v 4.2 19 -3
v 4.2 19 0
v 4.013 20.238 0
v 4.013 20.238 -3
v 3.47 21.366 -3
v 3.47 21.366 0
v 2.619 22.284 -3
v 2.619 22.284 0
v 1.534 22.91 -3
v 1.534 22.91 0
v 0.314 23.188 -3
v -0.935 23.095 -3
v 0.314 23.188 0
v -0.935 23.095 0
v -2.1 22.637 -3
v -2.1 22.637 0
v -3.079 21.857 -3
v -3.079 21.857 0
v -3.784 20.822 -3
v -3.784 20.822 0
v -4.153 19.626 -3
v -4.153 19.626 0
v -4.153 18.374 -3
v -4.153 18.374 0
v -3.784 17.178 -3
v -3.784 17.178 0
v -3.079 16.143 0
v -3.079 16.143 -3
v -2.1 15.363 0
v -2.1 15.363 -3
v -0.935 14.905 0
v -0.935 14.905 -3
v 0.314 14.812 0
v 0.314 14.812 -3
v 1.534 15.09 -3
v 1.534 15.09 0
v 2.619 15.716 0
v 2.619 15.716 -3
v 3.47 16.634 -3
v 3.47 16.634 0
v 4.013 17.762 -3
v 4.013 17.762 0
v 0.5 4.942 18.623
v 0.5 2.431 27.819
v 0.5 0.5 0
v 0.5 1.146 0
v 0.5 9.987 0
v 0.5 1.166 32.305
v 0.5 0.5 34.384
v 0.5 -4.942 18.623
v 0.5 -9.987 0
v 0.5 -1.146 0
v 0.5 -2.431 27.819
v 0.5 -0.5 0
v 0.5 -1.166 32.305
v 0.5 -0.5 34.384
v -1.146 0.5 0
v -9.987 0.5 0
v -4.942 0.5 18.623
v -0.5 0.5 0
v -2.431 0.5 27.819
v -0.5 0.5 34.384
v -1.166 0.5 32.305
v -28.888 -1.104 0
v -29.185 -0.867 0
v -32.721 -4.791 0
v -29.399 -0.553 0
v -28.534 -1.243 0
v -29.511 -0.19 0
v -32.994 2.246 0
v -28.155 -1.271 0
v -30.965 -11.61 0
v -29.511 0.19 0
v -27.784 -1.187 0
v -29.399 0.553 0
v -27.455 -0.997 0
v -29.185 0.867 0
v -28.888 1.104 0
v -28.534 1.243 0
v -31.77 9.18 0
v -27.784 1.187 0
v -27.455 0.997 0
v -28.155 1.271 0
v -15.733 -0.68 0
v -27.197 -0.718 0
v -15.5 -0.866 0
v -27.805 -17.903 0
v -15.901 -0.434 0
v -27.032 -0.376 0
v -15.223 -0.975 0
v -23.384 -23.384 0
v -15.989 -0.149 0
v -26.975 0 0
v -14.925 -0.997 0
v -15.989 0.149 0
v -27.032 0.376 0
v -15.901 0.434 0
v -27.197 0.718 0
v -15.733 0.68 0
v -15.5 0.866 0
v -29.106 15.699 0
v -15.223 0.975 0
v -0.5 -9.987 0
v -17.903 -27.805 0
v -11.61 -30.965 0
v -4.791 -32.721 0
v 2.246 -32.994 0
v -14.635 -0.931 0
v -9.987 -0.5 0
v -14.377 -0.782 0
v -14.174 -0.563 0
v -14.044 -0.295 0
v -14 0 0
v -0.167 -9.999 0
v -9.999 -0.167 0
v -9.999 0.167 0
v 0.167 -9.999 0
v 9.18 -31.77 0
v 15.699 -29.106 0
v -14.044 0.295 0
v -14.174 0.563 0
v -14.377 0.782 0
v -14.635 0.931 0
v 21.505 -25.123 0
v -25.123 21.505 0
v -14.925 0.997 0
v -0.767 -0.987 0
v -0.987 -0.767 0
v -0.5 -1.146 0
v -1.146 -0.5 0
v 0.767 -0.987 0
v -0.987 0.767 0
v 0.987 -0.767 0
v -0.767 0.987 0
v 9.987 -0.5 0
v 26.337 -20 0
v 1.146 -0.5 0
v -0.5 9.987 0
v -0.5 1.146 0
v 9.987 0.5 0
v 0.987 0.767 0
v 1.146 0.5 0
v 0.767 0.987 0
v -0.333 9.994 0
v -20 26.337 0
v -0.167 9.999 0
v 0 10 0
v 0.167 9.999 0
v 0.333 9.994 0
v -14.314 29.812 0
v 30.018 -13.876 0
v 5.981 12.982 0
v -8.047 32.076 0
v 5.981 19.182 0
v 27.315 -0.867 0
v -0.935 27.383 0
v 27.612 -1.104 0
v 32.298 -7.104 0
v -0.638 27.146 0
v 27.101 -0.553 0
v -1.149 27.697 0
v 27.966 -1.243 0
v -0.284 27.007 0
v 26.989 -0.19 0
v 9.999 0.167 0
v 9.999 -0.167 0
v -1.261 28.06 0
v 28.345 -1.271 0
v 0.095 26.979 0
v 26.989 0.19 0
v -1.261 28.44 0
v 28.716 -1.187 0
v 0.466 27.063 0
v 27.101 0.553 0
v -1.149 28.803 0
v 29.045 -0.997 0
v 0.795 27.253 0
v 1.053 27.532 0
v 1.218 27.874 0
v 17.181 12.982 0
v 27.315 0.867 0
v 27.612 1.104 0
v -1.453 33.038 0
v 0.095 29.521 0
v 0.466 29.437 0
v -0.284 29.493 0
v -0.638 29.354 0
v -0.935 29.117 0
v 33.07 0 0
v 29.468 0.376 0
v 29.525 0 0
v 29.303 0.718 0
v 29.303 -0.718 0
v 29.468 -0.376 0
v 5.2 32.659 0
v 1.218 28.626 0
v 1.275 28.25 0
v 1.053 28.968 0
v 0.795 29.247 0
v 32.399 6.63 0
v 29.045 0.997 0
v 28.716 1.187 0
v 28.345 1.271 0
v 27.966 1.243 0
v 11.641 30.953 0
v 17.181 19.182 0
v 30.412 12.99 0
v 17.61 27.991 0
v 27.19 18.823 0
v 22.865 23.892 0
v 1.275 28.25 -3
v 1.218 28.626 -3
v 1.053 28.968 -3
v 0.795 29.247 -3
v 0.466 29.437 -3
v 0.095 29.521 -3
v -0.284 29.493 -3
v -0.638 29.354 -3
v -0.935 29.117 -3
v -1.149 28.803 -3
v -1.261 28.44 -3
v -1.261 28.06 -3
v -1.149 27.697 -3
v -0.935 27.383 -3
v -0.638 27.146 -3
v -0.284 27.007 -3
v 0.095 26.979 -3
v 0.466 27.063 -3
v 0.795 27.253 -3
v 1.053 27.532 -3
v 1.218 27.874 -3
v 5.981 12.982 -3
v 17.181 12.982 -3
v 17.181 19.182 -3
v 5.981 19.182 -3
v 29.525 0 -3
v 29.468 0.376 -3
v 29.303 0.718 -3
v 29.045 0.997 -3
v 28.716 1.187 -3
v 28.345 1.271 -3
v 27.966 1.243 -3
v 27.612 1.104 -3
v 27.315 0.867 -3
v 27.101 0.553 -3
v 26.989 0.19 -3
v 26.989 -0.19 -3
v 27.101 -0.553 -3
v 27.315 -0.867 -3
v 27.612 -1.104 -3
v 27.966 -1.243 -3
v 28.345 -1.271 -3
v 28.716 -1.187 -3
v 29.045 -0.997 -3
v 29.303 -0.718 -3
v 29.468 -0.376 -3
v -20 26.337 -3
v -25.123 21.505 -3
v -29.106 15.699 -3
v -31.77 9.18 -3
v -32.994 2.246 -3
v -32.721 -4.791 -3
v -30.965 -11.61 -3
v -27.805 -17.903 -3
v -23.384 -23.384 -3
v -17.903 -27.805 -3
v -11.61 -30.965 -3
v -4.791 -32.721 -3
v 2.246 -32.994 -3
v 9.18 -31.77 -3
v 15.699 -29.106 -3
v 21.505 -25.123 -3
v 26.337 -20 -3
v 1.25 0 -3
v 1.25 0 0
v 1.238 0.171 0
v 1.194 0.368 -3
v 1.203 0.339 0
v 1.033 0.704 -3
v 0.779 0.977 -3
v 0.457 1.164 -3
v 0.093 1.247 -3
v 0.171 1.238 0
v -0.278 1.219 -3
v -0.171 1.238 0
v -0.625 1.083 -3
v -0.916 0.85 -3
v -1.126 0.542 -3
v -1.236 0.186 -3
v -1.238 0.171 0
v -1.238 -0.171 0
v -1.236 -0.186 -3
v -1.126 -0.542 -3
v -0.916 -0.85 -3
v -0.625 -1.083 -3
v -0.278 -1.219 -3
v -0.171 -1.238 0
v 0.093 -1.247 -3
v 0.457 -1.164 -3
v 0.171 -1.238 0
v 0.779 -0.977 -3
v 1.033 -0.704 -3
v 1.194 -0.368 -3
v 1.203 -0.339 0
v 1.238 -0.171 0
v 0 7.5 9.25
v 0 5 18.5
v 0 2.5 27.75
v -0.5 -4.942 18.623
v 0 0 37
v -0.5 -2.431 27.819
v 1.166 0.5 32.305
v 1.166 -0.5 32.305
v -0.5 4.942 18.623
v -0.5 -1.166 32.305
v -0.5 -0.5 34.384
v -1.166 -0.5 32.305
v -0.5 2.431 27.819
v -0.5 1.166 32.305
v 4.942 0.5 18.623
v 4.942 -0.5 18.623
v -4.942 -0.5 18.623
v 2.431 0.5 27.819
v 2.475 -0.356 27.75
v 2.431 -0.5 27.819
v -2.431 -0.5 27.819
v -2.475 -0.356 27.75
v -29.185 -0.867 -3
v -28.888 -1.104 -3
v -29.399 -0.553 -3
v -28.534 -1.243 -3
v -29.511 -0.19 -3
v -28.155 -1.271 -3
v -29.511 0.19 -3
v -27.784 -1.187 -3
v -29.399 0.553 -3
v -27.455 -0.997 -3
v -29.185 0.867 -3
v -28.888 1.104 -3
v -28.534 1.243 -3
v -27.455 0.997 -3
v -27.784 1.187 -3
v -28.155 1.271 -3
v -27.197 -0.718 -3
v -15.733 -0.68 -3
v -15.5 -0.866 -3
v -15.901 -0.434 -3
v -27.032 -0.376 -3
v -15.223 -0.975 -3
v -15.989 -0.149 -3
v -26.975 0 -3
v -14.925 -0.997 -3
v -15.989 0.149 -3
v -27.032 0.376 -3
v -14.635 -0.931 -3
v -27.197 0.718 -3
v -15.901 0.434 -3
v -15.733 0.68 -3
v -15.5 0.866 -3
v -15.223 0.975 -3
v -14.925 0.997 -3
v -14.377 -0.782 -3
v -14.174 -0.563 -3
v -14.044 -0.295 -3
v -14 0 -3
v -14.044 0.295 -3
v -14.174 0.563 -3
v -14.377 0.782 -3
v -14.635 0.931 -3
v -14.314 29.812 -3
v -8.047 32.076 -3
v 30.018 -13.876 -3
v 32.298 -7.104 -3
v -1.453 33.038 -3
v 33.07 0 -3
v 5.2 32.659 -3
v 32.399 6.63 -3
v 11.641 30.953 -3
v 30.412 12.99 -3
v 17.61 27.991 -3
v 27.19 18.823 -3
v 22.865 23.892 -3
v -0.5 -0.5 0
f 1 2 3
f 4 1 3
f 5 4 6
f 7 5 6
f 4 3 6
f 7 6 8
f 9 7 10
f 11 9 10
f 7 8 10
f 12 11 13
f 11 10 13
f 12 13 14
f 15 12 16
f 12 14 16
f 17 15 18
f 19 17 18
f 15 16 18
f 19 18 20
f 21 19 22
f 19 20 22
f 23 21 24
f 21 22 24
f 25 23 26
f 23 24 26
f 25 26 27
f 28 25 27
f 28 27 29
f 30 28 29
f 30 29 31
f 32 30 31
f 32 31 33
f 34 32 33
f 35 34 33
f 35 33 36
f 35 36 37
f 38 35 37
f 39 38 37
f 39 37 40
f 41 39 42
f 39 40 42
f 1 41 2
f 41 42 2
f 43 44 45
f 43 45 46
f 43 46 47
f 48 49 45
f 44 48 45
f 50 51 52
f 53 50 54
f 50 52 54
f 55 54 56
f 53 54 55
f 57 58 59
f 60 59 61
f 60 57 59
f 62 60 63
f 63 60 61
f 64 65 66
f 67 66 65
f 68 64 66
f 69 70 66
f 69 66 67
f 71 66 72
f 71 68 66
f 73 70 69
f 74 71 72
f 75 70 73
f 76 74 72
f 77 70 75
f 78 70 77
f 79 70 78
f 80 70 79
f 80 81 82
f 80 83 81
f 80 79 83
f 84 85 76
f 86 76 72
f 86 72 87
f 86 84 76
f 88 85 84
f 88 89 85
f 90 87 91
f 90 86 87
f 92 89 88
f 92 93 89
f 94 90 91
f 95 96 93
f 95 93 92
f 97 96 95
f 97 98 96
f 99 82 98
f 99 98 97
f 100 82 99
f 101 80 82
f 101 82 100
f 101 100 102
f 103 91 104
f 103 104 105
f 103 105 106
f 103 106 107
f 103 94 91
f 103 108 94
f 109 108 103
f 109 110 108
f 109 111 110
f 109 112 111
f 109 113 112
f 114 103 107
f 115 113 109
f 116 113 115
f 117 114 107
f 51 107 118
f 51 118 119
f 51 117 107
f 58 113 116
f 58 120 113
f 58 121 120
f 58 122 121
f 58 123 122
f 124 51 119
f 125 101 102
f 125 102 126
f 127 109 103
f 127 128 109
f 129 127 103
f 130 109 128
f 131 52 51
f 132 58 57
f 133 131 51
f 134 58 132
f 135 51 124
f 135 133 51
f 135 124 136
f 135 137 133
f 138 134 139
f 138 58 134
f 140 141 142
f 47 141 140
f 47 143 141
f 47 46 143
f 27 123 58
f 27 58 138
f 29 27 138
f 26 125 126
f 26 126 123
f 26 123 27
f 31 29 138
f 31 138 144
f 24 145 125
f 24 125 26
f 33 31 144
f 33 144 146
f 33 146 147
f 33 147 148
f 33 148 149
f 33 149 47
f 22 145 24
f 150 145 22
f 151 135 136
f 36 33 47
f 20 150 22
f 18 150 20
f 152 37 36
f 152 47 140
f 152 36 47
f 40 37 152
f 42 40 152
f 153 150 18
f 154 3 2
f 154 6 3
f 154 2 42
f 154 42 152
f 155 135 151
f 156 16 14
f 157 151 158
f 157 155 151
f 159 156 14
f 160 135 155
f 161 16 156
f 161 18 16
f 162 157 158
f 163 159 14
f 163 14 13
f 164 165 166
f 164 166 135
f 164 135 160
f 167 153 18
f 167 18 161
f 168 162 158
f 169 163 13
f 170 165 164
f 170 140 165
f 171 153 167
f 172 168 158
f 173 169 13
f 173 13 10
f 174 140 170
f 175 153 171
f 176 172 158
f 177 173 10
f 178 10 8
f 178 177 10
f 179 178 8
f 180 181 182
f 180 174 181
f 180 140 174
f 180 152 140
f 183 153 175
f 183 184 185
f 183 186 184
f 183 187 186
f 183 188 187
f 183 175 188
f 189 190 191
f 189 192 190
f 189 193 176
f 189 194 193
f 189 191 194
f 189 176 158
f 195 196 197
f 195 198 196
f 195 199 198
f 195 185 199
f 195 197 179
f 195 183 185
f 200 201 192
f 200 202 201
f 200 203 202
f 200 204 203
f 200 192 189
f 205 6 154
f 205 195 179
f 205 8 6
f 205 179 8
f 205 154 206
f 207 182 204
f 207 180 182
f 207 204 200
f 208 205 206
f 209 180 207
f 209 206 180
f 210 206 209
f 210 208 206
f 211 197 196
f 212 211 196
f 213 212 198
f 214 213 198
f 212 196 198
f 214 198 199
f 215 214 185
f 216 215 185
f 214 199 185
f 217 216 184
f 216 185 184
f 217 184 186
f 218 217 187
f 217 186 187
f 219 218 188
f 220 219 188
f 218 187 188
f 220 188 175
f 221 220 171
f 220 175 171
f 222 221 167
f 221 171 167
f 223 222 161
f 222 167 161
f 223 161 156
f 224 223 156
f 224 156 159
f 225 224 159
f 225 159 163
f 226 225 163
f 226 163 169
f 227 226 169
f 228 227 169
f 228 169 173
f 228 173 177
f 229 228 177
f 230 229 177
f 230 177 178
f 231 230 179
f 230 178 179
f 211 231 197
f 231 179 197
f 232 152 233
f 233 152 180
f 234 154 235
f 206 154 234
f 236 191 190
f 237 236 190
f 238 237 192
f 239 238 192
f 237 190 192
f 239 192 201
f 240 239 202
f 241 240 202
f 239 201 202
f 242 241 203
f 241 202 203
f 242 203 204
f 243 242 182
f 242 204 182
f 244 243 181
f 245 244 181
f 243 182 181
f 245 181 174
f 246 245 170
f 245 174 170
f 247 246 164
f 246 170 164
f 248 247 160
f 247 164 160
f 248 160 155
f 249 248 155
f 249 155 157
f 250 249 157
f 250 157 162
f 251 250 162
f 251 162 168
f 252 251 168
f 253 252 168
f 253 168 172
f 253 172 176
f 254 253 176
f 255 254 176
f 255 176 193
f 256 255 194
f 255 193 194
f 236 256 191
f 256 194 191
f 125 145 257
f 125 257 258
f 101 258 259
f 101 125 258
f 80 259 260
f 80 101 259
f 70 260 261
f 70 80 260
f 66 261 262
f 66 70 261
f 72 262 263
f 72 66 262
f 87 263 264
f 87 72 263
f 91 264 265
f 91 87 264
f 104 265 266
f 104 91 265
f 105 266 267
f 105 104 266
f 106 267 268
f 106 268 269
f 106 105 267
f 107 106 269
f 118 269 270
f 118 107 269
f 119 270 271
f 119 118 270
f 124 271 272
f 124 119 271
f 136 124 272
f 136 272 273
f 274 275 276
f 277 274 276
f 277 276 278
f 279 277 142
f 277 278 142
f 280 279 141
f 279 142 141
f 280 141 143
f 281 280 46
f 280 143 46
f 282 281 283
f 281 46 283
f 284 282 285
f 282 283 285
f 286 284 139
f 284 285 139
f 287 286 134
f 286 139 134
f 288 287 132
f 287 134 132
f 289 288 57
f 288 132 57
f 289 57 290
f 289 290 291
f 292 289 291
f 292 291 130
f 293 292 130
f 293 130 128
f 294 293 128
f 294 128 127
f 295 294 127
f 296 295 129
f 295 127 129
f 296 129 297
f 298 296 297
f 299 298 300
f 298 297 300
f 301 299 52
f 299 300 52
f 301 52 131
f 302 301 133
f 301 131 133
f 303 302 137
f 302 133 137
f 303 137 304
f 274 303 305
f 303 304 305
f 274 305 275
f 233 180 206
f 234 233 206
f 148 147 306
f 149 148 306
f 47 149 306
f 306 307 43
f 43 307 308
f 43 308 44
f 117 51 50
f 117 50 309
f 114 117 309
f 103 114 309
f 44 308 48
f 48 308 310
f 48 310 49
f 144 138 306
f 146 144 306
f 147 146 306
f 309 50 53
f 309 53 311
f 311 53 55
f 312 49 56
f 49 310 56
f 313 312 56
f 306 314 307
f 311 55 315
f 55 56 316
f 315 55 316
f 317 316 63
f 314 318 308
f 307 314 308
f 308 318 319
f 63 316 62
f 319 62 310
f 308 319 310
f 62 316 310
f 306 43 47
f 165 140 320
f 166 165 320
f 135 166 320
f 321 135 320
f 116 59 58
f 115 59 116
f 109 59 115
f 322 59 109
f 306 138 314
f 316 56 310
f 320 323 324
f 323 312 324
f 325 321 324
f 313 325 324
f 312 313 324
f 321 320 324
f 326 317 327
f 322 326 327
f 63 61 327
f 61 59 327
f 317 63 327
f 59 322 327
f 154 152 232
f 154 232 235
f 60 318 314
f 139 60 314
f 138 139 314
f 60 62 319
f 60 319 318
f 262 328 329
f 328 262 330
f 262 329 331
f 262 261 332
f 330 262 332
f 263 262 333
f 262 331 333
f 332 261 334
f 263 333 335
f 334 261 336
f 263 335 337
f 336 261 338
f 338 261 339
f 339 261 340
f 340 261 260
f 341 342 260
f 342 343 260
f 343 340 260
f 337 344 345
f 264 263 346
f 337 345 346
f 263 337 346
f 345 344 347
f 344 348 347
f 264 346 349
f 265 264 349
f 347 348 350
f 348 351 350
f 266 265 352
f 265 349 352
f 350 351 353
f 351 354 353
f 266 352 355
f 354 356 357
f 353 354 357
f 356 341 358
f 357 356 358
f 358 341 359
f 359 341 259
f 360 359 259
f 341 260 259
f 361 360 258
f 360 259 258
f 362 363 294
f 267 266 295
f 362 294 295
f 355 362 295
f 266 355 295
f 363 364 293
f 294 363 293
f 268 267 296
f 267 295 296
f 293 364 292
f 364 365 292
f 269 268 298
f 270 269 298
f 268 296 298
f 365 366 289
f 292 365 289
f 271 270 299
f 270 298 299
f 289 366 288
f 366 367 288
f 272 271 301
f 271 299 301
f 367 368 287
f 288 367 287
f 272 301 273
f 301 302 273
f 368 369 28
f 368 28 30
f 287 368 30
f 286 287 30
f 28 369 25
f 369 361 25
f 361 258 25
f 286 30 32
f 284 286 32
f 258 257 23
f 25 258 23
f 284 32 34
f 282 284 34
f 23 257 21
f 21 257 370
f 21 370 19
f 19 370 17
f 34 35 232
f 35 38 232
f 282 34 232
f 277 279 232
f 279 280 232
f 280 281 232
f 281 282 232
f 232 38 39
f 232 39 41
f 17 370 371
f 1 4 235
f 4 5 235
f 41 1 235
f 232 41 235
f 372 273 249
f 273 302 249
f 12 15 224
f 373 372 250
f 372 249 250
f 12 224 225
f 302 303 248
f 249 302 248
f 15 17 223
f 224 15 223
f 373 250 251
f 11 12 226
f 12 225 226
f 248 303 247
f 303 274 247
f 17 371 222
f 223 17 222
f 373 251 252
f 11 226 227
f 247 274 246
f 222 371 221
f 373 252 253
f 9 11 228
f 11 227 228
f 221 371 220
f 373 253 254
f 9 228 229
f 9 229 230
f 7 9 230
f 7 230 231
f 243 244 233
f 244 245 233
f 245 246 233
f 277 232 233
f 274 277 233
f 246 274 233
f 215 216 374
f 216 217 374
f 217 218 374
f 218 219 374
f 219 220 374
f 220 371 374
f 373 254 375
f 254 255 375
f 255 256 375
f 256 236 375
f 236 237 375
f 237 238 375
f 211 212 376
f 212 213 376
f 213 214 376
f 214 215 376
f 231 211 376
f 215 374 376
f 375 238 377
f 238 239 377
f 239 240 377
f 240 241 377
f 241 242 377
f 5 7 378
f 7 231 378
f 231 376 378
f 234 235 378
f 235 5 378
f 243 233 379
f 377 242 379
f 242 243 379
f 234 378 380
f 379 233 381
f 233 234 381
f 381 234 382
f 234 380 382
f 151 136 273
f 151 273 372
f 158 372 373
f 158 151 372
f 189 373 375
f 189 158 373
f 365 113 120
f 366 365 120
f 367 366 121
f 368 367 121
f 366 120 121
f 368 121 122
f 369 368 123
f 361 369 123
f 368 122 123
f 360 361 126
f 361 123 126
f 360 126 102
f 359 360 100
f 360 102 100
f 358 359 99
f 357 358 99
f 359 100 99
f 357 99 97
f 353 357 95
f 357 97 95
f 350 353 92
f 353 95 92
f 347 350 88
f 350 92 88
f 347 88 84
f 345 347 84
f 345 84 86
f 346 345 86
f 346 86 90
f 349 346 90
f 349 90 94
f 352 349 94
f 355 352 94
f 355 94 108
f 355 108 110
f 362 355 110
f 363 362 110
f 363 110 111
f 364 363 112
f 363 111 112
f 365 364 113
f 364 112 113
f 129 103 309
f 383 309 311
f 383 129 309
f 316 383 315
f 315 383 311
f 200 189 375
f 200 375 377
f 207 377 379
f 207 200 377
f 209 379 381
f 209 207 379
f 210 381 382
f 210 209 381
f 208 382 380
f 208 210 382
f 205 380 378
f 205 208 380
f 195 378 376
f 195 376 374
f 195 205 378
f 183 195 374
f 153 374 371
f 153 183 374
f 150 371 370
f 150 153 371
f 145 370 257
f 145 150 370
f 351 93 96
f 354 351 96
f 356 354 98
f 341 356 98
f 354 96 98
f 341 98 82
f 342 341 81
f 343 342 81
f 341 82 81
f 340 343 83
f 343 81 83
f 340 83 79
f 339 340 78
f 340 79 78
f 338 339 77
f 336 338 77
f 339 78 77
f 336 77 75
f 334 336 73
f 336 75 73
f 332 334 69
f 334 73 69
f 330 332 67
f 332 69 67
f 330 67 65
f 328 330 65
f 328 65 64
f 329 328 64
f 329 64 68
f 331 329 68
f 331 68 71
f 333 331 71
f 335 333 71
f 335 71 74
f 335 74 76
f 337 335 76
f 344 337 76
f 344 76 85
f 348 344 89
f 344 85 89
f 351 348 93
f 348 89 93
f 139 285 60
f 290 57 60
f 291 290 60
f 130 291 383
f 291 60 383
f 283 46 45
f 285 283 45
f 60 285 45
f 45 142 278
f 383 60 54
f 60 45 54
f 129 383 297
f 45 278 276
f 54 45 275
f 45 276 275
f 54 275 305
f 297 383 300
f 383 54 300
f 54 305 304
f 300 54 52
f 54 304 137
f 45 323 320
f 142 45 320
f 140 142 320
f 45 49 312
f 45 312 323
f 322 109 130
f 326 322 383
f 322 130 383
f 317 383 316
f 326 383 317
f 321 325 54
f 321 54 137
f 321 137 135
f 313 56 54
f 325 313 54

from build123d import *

# Parameters (mm, degrees)
F0_R     = 1
F0_R_2   = 1.25
F0_R_3   = 4.2
F0_R_4   = 1.275
F0_W     = 11.2
F0_H     = 6.2
F1_DEPTH = 3
F4_W     = 10.83598
F4_H     = 10.83598
F5_DEPTH = 40


with BuildPart() as f1:
    # F0 (on Top) → F1 (new body)
    with BuildSketch(Plane.XY):
        with BuildLine():
            ThreePointArc((26.336773, -20), (31.34153, -10.551499), (33.070011, 0))
            ThreePointArc((33.070011, 0), (14.700772, 29.622845), (-20, 26.336773))
            Line((-20, 26.336773), (-20, -20))
            Line((-20, -20), (26.336773, -20))
        make_face()
        with Locations((-15, 3e-06)):
            Circle(F0_R, mode=Mode.SUBTRACT)
        Circle(F0_R_2, mode=Mode.SUBTRACT)
        with Locations((0, 19)):
            Circle(F0_R_3, mode=Mode.SUBTRACT)
        with Locations((0, 28.25)):
            Circle(F0_R_4, mode=Mode.SUBTRACT)
        with Locations((11.580758, 16.082448)):
            Rectangle(F0_W, F0_H, mode=Mode.SUBTRACT)
        with Locations((28.25, 0)):
            Circle(F0_R_4, mode=Mode.SUBTRACT)
        with BuildLine():
            Line((-20, -20), (-20, 26.336773))
            ThreePointArc((-20, 26.336773), (-23.384029, -23.384029), (26.336773, -20))
            Line((26.336773, -20), (-20, -20))
        make_face()
        with Locations((-28.25, 0)):
            Circle(F0_R_4, mode=Mode.SUBTRACT)
    extrude(amount=-F1_DEPTH)

    # F2 (on Right) → F3 (revolve)
    with BuildSketch(Plane.YZ):
        Polygon((10, 0), (0, 37), (0, 0), align=None)
    revolve(axis=Axis((0, 0, 18.5), (0, 0, -1)))

    # F4 (on Top) → F5 (cut)
    with BuildSketch(Plane.XY):
        with Locations((-5.91799, 5.91799)):
            Rectangle(F4_W, F4_H)
        with Locations((5.91799, 5.91799)):
            Rectangle(F4_W, F4_H)
        with Locations((5.91799, -5.91799)):
            Rectangle(F4_W, F4_H)
        with Locations((-5.91799, -5.91799)):
            Rectangle(F4_W, F4_H)
    extrude(amount=F5_DEPTH, mode=Mode.SUBTRACT)


solid = f1.part
